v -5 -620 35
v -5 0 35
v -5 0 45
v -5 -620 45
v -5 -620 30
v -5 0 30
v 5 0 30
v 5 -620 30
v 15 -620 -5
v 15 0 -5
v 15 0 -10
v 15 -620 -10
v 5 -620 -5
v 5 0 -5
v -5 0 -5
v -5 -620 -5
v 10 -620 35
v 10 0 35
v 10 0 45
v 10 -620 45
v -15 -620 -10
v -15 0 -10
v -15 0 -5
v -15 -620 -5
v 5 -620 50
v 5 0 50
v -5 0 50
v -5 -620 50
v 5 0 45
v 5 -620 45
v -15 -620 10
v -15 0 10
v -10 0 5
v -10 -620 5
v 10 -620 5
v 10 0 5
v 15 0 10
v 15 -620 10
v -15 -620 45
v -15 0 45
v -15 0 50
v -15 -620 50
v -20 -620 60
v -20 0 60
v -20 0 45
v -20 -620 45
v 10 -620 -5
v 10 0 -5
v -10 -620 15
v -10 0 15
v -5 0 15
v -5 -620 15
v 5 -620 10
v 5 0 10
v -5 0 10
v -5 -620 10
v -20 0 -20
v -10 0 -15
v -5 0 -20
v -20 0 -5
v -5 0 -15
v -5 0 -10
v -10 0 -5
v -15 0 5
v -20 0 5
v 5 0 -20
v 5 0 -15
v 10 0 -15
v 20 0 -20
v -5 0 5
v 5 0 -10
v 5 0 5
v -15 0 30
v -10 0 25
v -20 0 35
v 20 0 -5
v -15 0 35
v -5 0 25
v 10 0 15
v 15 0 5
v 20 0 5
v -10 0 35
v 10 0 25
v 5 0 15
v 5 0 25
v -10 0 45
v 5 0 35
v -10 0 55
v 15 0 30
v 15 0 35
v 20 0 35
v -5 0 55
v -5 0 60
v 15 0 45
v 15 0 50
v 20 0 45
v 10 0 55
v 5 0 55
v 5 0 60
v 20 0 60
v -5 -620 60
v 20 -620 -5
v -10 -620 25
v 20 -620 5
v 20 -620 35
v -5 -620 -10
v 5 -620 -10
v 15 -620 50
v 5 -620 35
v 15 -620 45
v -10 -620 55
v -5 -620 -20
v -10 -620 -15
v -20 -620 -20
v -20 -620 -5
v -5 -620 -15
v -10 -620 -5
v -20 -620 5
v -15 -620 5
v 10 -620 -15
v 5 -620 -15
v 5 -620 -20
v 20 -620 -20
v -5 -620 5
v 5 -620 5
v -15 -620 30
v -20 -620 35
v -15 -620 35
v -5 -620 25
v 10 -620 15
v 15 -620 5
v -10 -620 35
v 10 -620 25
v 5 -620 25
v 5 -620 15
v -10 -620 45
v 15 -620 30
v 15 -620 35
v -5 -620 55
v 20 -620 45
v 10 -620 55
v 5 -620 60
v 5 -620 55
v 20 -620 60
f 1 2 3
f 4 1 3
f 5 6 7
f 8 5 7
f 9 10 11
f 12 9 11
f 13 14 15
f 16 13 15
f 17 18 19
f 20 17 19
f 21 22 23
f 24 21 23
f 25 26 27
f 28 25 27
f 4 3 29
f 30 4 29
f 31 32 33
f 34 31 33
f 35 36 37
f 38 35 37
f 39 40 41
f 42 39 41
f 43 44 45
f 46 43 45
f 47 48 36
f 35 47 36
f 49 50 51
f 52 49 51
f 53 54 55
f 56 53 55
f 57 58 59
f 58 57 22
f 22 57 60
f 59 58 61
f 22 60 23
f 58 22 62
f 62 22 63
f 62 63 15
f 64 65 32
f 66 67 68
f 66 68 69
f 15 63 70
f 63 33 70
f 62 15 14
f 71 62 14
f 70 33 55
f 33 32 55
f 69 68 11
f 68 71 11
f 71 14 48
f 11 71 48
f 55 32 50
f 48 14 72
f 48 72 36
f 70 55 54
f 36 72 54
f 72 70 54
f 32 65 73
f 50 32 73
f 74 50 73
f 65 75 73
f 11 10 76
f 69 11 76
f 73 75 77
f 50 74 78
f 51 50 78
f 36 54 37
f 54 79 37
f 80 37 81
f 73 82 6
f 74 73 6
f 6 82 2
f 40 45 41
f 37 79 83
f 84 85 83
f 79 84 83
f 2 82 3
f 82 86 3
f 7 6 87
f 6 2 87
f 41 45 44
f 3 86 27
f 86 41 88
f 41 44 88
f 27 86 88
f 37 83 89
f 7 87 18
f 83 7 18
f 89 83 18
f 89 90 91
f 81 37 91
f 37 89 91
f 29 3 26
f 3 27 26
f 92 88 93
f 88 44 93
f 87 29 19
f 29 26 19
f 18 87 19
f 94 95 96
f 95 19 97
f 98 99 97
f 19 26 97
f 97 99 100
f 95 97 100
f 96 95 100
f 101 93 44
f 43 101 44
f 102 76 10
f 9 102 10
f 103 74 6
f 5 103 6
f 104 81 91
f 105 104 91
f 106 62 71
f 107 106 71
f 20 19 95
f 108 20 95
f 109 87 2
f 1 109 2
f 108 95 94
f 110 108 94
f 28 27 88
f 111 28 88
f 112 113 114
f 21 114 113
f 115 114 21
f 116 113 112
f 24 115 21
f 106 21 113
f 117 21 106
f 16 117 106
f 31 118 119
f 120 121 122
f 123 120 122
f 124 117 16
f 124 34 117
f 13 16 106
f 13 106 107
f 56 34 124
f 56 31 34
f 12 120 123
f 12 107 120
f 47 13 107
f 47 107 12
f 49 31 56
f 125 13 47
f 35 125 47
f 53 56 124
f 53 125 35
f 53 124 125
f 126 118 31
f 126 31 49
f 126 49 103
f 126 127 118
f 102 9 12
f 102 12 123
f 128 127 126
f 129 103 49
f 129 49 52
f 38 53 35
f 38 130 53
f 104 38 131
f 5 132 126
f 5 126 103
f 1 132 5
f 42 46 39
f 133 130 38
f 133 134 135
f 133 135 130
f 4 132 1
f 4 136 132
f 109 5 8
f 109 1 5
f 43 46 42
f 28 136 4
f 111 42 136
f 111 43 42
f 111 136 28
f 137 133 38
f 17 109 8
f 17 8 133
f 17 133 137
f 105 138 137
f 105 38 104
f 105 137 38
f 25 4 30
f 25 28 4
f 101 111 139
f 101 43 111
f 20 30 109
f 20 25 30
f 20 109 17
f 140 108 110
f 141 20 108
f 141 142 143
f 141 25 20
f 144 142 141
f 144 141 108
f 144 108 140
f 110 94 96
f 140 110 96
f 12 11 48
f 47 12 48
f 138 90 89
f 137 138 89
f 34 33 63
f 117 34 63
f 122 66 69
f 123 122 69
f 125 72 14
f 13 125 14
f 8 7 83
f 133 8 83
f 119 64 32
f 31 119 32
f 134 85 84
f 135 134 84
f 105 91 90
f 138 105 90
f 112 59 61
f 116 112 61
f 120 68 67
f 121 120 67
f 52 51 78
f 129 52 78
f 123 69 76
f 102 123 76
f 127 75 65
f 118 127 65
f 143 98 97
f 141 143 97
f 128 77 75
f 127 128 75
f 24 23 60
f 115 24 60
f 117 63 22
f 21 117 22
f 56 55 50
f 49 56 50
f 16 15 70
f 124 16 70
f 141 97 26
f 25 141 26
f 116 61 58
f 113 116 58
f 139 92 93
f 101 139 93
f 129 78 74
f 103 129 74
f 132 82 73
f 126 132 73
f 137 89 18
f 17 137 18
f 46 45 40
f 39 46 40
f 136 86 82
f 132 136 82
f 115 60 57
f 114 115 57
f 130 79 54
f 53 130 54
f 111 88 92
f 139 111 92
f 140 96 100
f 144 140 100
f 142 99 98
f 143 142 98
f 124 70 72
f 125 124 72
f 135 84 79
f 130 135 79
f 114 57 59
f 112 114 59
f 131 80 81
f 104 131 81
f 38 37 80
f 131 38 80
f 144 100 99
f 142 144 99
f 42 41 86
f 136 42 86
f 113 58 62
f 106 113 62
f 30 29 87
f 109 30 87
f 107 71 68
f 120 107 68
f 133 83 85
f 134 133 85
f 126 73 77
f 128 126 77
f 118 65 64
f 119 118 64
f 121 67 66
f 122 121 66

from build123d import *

# Parameters (mm, degrees)
F1_DEPTH = 620


with BuildPart() as f1:
    # F0 (on Front) → F1 (new body)
    with BuildSketch(Plane.XZ):
        Polygon((5, -20), (20, -20), (20, -5), (15, -5), (15, -10), (10, -5), (10, 5), (15, 10), (15, 5), (20, 5), (20, 20), (20, 35), (15, 35), (15, 30), (10, 35), (10, 45), (15, 50), (15, 45), (20, 45), (20, 60), (5, 60), (5, 55), (10, 55), (5, 50), (-5, 50), (-10, 55), (-5, 55), (-5, 60), (-20, 60), (-20, 45), (-15, 45), (-15, 50), (-10, 45), (-10, 35), (-15, 30), (-15, 35), (-20, 35), (-20, 20), (-20, 5), (-15, 5), (-15, 10), (-10, 5), (-10, -5), (-15, -10), (-15, -5), (-20, -5), (-20, -20), (-5, -20), (-5, -15), (-10, -15), (-5, -10), (5, -10), (10, -15), (5, -15), align=None)
        Polygon((-5, 0), (-5, 5), (0, 5), (5, 5), (5, 0), (5, -5), (0, -5), (-5, -5), align=None, mode=Mode.SUBTRACT)
        Polygon((-5, 15), (-5, 20), (-5, 25), (-10, 25), (-5, 30), (5, 30), (10, 25), (5, 25), (5, 20), (5, 15), (10, 15), (5, 10), (-5, 10), (-10, 15), align=None, mode=Mode.SUBTRACT)
        Polygon((-5, 40), (-5, 45), (0, 45), (5, 45), (5, 40), (5, 35), (0, 35), (-5, 35), align=None, mode=Mode.SUBTRACT)
    extrude(amount=F1_DEPTH)


solid = f1.part
